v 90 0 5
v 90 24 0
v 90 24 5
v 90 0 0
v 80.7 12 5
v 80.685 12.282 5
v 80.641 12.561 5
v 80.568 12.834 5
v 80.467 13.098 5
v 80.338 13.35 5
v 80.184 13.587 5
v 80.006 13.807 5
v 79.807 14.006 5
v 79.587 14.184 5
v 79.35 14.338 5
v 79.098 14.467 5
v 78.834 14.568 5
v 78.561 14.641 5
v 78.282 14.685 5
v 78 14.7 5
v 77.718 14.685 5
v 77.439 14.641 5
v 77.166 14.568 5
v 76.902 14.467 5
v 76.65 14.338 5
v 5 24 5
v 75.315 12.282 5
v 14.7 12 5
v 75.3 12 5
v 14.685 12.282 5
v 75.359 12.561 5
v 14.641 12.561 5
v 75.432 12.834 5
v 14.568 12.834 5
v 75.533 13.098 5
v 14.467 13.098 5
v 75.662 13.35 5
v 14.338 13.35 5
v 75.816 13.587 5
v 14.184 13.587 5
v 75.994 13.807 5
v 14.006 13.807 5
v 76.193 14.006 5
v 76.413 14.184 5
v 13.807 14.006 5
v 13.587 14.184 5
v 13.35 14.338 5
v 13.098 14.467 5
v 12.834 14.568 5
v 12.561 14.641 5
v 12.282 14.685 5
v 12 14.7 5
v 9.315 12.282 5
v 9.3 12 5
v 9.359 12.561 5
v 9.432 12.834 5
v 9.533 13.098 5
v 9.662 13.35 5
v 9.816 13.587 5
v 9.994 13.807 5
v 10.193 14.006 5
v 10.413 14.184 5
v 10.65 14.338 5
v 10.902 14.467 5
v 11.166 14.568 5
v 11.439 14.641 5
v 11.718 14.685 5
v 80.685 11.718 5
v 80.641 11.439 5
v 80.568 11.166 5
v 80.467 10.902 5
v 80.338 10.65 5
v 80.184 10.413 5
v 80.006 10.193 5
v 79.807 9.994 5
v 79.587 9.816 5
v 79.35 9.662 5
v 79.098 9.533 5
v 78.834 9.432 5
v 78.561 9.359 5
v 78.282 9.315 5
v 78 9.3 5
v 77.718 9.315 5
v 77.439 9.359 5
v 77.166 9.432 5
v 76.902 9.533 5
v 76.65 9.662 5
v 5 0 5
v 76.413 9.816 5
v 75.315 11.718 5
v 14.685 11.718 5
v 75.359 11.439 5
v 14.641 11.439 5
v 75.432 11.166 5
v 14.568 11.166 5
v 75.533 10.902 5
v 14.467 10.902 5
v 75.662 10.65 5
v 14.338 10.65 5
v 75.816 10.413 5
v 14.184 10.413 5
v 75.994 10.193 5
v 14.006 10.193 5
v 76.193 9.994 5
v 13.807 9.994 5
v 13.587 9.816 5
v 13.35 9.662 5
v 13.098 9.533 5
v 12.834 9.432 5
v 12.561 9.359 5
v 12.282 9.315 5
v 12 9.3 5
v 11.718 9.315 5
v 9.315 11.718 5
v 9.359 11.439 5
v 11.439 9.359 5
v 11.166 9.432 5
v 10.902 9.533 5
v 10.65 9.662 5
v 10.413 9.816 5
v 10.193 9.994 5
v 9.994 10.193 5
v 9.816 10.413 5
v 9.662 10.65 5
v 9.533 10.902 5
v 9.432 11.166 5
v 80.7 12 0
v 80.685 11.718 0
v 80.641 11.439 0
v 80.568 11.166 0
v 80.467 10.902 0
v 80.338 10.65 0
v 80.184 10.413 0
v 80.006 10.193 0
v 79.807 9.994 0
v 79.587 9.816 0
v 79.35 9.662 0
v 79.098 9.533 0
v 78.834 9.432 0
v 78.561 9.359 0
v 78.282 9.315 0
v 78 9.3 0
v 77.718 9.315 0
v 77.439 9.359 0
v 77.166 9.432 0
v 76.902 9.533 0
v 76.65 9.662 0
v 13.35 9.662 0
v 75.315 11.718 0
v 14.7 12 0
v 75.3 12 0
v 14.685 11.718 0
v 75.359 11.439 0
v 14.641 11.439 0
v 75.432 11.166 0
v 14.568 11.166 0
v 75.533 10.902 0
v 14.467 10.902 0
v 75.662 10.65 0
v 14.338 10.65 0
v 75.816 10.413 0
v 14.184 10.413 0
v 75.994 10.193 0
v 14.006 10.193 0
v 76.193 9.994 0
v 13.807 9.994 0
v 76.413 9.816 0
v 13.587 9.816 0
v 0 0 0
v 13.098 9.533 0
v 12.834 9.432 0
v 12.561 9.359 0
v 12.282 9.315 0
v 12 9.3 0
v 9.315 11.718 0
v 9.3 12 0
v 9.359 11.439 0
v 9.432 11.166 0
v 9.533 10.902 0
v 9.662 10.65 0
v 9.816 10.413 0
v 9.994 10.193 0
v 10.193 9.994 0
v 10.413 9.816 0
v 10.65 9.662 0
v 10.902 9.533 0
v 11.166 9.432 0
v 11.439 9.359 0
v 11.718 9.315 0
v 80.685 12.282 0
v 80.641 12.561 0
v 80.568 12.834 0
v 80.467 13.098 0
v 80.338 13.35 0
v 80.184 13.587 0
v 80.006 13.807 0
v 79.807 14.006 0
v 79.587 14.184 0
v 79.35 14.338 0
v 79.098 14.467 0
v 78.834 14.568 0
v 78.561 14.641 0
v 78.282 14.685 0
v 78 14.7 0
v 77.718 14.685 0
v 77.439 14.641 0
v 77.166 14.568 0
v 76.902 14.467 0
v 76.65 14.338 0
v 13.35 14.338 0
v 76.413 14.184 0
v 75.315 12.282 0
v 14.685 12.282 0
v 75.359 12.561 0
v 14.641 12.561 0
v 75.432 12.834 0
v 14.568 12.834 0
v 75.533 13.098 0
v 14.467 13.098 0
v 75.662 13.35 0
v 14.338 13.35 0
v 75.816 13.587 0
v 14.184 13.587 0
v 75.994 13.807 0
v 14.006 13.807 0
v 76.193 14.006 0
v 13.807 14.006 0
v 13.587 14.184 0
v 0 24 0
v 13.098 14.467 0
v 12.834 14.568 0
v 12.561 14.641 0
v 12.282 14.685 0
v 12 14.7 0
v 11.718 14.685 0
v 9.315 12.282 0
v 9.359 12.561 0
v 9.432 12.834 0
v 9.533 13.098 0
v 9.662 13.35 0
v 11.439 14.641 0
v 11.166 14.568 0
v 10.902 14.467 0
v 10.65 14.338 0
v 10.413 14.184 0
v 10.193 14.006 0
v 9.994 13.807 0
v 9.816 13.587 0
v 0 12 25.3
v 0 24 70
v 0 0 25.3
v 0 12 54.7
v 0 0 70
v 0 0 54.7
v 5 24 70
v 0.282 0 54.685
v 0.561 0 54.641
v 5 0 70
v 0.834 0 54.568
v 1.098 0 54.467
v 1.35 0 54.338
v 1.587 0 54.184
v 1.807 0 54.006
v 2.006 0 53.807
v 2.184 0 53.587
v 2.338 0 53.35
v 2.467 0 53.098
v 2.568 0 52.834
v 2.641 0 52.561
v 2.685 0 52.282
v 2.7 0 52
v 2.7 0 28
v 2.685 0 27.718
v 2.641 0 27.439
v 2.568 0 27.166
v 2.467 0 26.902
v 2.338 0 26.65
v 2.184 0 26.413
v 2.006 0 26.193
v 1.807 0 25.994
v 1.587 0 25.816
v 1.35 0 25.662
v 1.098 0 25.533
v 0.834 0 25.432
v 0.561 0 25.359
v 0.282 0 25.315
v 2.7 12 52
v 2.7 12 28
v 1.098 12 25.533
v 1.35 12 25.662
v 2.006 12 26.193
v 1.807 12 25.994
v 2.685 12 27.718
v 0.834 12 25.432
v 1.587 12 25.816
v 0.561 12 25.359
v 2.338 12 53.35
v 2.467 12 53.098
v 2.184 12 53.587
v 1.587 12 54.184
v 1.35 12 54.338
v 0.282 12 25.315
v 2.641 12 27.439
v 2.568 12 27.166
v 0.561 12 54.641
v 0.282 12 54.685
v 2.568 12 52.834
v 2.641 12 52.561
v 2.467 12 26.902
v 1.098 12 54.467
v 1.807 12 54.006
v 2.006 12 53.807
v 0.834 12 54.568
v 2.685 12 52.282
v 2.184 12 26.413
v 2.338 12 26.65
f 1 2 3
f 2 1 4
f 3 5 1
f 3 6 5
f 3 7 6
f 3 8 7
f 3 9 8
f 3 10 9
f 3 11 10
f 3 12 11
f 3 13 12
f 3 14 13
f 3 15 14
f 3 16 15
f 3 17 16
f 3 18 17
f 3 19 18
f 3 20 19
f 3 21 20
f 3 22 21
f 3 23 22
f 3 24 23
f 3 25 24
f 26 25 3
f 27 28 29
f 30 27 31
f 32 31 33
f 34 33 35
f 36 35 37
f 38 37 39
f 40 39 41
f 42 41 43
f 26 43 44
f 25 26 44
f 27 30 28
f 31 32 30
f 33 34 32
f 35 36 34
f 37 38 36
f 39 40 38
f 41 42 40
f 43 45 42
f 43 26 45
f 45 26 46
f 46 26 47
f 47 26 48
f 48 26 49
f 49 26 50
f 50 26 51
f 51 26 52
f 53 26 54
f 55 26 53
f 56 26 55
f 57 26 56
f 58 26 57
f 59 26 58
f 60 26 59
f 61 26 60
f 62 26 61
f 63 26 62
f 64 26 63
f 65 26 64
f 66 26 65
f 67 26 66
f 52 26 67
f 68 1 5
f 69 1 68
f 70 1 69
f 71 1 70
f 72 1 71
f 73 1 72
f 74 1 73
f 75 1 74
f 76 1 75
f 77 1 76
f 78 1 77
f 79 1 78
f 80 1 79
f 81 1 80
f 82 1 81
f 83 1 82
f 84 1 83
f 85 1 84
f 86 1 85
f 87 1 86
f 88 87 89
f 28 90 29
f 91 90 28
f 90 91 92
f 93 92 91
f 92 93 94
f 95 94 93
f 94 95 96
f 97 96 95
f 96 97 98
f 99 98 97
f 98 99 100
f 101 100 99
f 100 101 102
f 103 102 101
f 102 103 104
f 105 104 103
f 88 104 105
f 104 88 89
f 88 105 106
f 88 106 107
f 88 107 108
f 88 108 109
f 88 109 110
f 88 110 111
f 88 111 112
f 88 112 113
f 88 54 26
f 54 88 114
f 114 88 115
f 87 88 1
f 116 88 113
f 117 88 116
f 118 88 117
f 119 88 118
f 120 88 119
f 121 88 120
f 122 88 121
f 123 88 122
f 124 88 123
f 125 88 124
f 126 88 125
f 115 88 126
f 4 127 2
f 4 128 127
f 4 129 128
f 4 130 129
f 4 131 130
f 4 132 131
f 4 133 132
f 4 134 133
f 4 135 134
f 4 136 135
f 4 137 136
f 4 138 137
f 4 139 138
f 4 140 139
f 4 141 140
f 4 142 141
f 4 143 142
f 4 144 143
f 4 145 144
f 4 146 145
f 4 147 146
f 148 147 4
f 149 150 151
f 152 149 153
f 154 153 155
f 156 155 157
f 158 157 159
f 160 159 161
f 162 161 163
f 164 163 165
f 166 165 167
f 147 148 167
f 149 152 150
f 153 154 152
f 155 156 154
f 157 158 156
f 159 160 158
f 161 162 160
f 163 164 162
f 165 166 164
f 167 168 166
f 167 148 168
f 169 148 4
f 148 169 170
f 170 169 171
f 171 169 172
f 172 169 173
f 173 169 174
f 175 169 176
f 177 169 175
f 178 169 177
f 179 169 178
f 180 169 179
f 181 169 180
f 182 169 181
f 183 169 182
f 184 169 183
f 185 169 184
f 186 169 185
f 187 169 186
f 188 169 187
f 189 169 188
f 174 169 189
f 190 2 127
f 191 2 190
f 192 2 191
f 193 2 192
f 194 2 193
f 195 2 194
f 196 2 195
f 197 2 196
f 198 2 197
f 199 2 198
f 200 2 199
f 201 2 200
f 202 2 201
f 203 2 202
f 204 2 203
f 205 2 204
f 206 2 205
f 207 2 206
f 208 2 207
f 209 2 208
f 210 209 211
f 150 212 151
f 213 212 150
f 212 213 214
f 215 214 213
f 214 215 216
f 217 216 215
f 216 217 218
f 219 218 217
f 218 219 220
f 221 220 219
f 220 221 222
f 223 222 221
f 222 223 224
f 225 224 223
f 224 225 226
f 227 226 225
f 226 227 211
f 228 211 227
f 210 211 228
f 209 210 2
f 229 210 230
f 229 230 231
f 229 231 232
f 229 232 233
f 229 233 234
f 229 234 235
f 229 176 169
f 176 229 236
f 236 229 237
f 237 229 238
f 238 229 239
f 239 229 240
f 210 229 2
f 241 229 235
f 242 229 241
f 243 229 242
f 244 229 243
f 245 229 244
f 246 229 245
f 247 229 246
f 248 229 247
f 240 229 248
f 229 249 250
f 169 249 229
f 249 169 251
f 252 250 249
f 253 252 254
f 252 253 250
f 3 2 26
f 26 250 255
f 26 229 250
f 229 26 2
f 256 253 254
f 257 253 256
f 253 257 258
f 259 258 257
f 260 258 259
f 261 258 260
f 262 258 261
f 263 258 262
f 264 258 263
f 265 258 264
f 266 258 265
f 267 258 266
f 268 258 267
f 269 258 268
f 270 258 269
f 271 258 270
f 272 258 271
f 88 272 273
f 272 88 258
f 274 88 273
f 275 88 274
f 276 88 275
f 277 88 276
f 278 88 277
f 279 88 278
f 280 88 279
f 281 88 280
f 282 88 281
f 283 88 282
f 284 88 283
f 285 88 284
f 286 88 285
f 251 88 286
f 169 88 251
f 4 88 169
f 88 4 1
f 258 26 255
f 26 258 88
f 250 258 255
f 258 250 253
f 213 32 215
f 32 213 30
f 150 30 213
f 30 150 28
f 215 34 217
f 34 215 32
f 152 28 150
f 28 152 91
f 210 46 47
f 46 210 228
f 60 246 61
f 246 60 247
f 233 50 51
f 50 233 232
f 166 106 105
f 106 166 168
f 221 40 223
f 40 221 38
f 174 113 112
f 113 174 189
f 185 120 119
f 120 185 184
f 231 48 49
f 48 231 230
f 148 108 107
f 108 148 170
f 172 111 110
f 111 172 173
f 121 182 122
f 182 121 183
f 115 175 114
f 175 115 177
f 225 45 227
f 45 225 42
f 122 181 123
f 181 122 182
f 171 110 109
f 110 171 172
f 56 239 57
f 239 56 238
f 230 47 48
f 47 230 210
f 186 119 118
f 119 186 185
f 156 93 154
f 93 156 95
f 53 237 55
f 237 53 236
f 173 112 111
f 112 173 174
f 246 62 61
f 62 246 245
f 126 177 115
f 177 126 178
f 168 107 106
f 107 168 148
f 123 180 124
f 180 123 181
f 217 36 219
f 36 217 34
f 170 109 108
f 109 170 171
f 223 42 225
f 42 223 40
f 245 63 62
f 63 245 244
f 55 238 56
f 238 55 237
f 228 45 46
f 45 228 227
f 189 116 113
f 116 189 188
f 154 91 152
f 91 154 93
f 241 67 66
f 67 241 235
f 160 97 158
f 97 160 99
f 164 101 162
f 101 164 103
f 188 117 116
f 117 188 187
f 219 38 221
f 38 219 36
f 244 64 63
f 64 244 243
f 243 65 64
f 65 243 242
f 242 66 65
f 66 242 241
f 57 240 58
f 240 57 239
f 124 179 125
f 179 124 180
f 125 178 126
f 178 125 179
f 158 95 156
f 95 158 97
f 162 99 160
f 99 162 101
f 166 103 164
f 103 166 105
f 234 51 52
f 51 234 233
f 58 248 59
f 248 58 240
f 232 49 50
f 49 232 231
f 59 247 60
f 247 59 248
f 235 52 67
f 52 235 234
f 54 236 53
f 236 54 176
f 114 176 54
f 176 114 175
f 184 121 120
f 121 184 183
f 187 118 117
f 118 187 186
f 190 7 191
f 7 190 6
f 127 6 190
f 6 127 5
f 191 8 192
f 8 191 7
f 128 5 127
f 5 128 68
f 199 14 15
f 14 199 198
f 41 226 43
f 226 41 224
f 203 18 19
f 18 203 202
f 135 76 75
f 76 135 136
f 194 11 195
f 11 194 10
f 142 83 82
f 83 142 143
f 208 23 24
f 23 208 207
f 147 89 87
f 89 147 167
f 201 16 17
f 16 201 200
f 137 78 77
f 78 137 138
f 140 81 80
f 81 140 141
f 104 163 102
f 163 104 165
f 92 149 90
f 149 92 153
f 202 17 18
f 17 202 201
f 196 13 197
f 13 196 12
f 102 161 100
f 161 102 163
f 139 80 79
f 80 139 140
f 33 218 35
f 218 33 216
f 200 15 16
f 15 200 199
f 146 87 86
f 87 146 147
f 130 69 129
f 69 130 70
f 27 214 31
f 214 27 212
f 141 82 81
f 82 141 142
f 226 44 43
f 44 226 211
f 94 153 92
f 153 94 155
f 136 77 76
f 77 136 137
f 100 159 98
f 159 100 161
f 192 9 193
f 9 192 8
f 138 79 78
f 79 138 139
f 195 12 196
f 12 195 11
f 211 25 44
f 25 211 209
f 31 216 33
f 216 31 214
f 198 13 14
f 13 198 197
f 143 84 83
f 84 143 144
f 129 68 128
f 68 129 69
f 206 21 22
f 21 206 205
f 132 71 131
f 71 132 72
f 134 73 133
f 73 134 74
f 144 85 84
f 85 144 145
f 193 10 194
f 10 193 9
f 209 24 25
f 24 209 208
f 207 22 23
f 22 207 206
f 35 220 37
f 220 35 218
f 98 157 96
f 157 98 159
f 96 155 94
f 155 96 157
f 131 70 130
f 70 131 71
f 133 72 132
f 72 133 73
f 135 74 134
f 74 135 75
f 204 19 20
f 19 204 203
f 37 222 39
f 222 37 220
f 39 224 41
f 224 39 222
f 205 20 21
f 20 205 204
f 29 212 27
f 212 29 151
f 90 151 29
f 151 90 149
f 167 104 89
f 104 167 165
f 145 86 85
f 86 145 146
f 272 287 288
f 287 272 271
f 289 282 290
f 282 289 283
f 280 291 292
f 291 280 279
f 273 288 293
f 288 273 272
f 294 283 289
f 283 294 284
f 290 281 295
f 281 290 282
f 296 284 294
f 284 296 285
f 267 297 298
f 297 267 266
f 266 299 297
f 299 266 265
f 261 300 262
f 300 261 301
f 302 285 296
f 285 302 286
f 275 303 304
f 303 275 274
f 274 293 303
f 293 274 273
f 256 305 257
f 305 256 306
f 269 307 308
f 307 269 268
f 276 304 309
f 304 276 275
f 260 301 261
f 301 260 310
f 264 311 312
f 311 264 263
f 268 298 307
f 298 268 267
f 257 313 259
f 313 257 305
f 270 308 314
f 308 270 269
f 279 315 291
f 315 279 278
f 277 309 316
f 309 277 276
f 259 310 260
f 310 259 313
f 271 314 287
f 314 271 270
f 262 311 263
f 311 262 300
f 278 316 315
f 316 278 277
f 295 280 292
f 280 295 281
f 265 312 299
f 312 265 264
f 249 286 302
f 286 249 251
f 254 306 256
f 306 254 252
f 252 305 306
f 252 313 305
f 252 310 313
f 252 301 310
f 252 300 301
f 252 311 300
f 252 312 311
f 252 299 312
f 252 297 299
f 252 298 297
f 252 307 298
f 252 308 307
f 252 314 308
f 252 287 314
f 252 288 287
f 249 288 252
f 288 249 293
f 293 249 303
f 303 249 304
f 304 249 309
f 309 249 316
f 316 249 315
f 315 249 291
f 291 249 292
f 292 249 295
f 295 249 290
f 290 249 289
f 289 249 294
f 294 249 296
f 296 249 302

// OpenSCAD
// Adjustable L bracket with upright slot.
$fn = 60;
eps = 0.02;
base_l = 90;
upright_h = 70;
width = 24;
thickness = 5;
slot_l = 24;
module vertical_slot() { hull() { translate([0,width/2,thickness+upright_h/2-slot_l/2]) rotate([90,0,0]) cylinder(d=5.4,h=width+2*eps); translate([0,width/2,thickness+upright_h/2+slot_l/2]) rotate([90,0,0]) cylinder(d=5.4,h=width+2*eps); } }
difference() {
    union() { cube([base_l,width,thickness]); cube([thickness,width,upright_h]); }
    for(x=[12,base_l-12]) translate([x,width/2,-eps]) cylinder(d=5.4,h=thickness+2*eps);
    vertical_slot();
}
